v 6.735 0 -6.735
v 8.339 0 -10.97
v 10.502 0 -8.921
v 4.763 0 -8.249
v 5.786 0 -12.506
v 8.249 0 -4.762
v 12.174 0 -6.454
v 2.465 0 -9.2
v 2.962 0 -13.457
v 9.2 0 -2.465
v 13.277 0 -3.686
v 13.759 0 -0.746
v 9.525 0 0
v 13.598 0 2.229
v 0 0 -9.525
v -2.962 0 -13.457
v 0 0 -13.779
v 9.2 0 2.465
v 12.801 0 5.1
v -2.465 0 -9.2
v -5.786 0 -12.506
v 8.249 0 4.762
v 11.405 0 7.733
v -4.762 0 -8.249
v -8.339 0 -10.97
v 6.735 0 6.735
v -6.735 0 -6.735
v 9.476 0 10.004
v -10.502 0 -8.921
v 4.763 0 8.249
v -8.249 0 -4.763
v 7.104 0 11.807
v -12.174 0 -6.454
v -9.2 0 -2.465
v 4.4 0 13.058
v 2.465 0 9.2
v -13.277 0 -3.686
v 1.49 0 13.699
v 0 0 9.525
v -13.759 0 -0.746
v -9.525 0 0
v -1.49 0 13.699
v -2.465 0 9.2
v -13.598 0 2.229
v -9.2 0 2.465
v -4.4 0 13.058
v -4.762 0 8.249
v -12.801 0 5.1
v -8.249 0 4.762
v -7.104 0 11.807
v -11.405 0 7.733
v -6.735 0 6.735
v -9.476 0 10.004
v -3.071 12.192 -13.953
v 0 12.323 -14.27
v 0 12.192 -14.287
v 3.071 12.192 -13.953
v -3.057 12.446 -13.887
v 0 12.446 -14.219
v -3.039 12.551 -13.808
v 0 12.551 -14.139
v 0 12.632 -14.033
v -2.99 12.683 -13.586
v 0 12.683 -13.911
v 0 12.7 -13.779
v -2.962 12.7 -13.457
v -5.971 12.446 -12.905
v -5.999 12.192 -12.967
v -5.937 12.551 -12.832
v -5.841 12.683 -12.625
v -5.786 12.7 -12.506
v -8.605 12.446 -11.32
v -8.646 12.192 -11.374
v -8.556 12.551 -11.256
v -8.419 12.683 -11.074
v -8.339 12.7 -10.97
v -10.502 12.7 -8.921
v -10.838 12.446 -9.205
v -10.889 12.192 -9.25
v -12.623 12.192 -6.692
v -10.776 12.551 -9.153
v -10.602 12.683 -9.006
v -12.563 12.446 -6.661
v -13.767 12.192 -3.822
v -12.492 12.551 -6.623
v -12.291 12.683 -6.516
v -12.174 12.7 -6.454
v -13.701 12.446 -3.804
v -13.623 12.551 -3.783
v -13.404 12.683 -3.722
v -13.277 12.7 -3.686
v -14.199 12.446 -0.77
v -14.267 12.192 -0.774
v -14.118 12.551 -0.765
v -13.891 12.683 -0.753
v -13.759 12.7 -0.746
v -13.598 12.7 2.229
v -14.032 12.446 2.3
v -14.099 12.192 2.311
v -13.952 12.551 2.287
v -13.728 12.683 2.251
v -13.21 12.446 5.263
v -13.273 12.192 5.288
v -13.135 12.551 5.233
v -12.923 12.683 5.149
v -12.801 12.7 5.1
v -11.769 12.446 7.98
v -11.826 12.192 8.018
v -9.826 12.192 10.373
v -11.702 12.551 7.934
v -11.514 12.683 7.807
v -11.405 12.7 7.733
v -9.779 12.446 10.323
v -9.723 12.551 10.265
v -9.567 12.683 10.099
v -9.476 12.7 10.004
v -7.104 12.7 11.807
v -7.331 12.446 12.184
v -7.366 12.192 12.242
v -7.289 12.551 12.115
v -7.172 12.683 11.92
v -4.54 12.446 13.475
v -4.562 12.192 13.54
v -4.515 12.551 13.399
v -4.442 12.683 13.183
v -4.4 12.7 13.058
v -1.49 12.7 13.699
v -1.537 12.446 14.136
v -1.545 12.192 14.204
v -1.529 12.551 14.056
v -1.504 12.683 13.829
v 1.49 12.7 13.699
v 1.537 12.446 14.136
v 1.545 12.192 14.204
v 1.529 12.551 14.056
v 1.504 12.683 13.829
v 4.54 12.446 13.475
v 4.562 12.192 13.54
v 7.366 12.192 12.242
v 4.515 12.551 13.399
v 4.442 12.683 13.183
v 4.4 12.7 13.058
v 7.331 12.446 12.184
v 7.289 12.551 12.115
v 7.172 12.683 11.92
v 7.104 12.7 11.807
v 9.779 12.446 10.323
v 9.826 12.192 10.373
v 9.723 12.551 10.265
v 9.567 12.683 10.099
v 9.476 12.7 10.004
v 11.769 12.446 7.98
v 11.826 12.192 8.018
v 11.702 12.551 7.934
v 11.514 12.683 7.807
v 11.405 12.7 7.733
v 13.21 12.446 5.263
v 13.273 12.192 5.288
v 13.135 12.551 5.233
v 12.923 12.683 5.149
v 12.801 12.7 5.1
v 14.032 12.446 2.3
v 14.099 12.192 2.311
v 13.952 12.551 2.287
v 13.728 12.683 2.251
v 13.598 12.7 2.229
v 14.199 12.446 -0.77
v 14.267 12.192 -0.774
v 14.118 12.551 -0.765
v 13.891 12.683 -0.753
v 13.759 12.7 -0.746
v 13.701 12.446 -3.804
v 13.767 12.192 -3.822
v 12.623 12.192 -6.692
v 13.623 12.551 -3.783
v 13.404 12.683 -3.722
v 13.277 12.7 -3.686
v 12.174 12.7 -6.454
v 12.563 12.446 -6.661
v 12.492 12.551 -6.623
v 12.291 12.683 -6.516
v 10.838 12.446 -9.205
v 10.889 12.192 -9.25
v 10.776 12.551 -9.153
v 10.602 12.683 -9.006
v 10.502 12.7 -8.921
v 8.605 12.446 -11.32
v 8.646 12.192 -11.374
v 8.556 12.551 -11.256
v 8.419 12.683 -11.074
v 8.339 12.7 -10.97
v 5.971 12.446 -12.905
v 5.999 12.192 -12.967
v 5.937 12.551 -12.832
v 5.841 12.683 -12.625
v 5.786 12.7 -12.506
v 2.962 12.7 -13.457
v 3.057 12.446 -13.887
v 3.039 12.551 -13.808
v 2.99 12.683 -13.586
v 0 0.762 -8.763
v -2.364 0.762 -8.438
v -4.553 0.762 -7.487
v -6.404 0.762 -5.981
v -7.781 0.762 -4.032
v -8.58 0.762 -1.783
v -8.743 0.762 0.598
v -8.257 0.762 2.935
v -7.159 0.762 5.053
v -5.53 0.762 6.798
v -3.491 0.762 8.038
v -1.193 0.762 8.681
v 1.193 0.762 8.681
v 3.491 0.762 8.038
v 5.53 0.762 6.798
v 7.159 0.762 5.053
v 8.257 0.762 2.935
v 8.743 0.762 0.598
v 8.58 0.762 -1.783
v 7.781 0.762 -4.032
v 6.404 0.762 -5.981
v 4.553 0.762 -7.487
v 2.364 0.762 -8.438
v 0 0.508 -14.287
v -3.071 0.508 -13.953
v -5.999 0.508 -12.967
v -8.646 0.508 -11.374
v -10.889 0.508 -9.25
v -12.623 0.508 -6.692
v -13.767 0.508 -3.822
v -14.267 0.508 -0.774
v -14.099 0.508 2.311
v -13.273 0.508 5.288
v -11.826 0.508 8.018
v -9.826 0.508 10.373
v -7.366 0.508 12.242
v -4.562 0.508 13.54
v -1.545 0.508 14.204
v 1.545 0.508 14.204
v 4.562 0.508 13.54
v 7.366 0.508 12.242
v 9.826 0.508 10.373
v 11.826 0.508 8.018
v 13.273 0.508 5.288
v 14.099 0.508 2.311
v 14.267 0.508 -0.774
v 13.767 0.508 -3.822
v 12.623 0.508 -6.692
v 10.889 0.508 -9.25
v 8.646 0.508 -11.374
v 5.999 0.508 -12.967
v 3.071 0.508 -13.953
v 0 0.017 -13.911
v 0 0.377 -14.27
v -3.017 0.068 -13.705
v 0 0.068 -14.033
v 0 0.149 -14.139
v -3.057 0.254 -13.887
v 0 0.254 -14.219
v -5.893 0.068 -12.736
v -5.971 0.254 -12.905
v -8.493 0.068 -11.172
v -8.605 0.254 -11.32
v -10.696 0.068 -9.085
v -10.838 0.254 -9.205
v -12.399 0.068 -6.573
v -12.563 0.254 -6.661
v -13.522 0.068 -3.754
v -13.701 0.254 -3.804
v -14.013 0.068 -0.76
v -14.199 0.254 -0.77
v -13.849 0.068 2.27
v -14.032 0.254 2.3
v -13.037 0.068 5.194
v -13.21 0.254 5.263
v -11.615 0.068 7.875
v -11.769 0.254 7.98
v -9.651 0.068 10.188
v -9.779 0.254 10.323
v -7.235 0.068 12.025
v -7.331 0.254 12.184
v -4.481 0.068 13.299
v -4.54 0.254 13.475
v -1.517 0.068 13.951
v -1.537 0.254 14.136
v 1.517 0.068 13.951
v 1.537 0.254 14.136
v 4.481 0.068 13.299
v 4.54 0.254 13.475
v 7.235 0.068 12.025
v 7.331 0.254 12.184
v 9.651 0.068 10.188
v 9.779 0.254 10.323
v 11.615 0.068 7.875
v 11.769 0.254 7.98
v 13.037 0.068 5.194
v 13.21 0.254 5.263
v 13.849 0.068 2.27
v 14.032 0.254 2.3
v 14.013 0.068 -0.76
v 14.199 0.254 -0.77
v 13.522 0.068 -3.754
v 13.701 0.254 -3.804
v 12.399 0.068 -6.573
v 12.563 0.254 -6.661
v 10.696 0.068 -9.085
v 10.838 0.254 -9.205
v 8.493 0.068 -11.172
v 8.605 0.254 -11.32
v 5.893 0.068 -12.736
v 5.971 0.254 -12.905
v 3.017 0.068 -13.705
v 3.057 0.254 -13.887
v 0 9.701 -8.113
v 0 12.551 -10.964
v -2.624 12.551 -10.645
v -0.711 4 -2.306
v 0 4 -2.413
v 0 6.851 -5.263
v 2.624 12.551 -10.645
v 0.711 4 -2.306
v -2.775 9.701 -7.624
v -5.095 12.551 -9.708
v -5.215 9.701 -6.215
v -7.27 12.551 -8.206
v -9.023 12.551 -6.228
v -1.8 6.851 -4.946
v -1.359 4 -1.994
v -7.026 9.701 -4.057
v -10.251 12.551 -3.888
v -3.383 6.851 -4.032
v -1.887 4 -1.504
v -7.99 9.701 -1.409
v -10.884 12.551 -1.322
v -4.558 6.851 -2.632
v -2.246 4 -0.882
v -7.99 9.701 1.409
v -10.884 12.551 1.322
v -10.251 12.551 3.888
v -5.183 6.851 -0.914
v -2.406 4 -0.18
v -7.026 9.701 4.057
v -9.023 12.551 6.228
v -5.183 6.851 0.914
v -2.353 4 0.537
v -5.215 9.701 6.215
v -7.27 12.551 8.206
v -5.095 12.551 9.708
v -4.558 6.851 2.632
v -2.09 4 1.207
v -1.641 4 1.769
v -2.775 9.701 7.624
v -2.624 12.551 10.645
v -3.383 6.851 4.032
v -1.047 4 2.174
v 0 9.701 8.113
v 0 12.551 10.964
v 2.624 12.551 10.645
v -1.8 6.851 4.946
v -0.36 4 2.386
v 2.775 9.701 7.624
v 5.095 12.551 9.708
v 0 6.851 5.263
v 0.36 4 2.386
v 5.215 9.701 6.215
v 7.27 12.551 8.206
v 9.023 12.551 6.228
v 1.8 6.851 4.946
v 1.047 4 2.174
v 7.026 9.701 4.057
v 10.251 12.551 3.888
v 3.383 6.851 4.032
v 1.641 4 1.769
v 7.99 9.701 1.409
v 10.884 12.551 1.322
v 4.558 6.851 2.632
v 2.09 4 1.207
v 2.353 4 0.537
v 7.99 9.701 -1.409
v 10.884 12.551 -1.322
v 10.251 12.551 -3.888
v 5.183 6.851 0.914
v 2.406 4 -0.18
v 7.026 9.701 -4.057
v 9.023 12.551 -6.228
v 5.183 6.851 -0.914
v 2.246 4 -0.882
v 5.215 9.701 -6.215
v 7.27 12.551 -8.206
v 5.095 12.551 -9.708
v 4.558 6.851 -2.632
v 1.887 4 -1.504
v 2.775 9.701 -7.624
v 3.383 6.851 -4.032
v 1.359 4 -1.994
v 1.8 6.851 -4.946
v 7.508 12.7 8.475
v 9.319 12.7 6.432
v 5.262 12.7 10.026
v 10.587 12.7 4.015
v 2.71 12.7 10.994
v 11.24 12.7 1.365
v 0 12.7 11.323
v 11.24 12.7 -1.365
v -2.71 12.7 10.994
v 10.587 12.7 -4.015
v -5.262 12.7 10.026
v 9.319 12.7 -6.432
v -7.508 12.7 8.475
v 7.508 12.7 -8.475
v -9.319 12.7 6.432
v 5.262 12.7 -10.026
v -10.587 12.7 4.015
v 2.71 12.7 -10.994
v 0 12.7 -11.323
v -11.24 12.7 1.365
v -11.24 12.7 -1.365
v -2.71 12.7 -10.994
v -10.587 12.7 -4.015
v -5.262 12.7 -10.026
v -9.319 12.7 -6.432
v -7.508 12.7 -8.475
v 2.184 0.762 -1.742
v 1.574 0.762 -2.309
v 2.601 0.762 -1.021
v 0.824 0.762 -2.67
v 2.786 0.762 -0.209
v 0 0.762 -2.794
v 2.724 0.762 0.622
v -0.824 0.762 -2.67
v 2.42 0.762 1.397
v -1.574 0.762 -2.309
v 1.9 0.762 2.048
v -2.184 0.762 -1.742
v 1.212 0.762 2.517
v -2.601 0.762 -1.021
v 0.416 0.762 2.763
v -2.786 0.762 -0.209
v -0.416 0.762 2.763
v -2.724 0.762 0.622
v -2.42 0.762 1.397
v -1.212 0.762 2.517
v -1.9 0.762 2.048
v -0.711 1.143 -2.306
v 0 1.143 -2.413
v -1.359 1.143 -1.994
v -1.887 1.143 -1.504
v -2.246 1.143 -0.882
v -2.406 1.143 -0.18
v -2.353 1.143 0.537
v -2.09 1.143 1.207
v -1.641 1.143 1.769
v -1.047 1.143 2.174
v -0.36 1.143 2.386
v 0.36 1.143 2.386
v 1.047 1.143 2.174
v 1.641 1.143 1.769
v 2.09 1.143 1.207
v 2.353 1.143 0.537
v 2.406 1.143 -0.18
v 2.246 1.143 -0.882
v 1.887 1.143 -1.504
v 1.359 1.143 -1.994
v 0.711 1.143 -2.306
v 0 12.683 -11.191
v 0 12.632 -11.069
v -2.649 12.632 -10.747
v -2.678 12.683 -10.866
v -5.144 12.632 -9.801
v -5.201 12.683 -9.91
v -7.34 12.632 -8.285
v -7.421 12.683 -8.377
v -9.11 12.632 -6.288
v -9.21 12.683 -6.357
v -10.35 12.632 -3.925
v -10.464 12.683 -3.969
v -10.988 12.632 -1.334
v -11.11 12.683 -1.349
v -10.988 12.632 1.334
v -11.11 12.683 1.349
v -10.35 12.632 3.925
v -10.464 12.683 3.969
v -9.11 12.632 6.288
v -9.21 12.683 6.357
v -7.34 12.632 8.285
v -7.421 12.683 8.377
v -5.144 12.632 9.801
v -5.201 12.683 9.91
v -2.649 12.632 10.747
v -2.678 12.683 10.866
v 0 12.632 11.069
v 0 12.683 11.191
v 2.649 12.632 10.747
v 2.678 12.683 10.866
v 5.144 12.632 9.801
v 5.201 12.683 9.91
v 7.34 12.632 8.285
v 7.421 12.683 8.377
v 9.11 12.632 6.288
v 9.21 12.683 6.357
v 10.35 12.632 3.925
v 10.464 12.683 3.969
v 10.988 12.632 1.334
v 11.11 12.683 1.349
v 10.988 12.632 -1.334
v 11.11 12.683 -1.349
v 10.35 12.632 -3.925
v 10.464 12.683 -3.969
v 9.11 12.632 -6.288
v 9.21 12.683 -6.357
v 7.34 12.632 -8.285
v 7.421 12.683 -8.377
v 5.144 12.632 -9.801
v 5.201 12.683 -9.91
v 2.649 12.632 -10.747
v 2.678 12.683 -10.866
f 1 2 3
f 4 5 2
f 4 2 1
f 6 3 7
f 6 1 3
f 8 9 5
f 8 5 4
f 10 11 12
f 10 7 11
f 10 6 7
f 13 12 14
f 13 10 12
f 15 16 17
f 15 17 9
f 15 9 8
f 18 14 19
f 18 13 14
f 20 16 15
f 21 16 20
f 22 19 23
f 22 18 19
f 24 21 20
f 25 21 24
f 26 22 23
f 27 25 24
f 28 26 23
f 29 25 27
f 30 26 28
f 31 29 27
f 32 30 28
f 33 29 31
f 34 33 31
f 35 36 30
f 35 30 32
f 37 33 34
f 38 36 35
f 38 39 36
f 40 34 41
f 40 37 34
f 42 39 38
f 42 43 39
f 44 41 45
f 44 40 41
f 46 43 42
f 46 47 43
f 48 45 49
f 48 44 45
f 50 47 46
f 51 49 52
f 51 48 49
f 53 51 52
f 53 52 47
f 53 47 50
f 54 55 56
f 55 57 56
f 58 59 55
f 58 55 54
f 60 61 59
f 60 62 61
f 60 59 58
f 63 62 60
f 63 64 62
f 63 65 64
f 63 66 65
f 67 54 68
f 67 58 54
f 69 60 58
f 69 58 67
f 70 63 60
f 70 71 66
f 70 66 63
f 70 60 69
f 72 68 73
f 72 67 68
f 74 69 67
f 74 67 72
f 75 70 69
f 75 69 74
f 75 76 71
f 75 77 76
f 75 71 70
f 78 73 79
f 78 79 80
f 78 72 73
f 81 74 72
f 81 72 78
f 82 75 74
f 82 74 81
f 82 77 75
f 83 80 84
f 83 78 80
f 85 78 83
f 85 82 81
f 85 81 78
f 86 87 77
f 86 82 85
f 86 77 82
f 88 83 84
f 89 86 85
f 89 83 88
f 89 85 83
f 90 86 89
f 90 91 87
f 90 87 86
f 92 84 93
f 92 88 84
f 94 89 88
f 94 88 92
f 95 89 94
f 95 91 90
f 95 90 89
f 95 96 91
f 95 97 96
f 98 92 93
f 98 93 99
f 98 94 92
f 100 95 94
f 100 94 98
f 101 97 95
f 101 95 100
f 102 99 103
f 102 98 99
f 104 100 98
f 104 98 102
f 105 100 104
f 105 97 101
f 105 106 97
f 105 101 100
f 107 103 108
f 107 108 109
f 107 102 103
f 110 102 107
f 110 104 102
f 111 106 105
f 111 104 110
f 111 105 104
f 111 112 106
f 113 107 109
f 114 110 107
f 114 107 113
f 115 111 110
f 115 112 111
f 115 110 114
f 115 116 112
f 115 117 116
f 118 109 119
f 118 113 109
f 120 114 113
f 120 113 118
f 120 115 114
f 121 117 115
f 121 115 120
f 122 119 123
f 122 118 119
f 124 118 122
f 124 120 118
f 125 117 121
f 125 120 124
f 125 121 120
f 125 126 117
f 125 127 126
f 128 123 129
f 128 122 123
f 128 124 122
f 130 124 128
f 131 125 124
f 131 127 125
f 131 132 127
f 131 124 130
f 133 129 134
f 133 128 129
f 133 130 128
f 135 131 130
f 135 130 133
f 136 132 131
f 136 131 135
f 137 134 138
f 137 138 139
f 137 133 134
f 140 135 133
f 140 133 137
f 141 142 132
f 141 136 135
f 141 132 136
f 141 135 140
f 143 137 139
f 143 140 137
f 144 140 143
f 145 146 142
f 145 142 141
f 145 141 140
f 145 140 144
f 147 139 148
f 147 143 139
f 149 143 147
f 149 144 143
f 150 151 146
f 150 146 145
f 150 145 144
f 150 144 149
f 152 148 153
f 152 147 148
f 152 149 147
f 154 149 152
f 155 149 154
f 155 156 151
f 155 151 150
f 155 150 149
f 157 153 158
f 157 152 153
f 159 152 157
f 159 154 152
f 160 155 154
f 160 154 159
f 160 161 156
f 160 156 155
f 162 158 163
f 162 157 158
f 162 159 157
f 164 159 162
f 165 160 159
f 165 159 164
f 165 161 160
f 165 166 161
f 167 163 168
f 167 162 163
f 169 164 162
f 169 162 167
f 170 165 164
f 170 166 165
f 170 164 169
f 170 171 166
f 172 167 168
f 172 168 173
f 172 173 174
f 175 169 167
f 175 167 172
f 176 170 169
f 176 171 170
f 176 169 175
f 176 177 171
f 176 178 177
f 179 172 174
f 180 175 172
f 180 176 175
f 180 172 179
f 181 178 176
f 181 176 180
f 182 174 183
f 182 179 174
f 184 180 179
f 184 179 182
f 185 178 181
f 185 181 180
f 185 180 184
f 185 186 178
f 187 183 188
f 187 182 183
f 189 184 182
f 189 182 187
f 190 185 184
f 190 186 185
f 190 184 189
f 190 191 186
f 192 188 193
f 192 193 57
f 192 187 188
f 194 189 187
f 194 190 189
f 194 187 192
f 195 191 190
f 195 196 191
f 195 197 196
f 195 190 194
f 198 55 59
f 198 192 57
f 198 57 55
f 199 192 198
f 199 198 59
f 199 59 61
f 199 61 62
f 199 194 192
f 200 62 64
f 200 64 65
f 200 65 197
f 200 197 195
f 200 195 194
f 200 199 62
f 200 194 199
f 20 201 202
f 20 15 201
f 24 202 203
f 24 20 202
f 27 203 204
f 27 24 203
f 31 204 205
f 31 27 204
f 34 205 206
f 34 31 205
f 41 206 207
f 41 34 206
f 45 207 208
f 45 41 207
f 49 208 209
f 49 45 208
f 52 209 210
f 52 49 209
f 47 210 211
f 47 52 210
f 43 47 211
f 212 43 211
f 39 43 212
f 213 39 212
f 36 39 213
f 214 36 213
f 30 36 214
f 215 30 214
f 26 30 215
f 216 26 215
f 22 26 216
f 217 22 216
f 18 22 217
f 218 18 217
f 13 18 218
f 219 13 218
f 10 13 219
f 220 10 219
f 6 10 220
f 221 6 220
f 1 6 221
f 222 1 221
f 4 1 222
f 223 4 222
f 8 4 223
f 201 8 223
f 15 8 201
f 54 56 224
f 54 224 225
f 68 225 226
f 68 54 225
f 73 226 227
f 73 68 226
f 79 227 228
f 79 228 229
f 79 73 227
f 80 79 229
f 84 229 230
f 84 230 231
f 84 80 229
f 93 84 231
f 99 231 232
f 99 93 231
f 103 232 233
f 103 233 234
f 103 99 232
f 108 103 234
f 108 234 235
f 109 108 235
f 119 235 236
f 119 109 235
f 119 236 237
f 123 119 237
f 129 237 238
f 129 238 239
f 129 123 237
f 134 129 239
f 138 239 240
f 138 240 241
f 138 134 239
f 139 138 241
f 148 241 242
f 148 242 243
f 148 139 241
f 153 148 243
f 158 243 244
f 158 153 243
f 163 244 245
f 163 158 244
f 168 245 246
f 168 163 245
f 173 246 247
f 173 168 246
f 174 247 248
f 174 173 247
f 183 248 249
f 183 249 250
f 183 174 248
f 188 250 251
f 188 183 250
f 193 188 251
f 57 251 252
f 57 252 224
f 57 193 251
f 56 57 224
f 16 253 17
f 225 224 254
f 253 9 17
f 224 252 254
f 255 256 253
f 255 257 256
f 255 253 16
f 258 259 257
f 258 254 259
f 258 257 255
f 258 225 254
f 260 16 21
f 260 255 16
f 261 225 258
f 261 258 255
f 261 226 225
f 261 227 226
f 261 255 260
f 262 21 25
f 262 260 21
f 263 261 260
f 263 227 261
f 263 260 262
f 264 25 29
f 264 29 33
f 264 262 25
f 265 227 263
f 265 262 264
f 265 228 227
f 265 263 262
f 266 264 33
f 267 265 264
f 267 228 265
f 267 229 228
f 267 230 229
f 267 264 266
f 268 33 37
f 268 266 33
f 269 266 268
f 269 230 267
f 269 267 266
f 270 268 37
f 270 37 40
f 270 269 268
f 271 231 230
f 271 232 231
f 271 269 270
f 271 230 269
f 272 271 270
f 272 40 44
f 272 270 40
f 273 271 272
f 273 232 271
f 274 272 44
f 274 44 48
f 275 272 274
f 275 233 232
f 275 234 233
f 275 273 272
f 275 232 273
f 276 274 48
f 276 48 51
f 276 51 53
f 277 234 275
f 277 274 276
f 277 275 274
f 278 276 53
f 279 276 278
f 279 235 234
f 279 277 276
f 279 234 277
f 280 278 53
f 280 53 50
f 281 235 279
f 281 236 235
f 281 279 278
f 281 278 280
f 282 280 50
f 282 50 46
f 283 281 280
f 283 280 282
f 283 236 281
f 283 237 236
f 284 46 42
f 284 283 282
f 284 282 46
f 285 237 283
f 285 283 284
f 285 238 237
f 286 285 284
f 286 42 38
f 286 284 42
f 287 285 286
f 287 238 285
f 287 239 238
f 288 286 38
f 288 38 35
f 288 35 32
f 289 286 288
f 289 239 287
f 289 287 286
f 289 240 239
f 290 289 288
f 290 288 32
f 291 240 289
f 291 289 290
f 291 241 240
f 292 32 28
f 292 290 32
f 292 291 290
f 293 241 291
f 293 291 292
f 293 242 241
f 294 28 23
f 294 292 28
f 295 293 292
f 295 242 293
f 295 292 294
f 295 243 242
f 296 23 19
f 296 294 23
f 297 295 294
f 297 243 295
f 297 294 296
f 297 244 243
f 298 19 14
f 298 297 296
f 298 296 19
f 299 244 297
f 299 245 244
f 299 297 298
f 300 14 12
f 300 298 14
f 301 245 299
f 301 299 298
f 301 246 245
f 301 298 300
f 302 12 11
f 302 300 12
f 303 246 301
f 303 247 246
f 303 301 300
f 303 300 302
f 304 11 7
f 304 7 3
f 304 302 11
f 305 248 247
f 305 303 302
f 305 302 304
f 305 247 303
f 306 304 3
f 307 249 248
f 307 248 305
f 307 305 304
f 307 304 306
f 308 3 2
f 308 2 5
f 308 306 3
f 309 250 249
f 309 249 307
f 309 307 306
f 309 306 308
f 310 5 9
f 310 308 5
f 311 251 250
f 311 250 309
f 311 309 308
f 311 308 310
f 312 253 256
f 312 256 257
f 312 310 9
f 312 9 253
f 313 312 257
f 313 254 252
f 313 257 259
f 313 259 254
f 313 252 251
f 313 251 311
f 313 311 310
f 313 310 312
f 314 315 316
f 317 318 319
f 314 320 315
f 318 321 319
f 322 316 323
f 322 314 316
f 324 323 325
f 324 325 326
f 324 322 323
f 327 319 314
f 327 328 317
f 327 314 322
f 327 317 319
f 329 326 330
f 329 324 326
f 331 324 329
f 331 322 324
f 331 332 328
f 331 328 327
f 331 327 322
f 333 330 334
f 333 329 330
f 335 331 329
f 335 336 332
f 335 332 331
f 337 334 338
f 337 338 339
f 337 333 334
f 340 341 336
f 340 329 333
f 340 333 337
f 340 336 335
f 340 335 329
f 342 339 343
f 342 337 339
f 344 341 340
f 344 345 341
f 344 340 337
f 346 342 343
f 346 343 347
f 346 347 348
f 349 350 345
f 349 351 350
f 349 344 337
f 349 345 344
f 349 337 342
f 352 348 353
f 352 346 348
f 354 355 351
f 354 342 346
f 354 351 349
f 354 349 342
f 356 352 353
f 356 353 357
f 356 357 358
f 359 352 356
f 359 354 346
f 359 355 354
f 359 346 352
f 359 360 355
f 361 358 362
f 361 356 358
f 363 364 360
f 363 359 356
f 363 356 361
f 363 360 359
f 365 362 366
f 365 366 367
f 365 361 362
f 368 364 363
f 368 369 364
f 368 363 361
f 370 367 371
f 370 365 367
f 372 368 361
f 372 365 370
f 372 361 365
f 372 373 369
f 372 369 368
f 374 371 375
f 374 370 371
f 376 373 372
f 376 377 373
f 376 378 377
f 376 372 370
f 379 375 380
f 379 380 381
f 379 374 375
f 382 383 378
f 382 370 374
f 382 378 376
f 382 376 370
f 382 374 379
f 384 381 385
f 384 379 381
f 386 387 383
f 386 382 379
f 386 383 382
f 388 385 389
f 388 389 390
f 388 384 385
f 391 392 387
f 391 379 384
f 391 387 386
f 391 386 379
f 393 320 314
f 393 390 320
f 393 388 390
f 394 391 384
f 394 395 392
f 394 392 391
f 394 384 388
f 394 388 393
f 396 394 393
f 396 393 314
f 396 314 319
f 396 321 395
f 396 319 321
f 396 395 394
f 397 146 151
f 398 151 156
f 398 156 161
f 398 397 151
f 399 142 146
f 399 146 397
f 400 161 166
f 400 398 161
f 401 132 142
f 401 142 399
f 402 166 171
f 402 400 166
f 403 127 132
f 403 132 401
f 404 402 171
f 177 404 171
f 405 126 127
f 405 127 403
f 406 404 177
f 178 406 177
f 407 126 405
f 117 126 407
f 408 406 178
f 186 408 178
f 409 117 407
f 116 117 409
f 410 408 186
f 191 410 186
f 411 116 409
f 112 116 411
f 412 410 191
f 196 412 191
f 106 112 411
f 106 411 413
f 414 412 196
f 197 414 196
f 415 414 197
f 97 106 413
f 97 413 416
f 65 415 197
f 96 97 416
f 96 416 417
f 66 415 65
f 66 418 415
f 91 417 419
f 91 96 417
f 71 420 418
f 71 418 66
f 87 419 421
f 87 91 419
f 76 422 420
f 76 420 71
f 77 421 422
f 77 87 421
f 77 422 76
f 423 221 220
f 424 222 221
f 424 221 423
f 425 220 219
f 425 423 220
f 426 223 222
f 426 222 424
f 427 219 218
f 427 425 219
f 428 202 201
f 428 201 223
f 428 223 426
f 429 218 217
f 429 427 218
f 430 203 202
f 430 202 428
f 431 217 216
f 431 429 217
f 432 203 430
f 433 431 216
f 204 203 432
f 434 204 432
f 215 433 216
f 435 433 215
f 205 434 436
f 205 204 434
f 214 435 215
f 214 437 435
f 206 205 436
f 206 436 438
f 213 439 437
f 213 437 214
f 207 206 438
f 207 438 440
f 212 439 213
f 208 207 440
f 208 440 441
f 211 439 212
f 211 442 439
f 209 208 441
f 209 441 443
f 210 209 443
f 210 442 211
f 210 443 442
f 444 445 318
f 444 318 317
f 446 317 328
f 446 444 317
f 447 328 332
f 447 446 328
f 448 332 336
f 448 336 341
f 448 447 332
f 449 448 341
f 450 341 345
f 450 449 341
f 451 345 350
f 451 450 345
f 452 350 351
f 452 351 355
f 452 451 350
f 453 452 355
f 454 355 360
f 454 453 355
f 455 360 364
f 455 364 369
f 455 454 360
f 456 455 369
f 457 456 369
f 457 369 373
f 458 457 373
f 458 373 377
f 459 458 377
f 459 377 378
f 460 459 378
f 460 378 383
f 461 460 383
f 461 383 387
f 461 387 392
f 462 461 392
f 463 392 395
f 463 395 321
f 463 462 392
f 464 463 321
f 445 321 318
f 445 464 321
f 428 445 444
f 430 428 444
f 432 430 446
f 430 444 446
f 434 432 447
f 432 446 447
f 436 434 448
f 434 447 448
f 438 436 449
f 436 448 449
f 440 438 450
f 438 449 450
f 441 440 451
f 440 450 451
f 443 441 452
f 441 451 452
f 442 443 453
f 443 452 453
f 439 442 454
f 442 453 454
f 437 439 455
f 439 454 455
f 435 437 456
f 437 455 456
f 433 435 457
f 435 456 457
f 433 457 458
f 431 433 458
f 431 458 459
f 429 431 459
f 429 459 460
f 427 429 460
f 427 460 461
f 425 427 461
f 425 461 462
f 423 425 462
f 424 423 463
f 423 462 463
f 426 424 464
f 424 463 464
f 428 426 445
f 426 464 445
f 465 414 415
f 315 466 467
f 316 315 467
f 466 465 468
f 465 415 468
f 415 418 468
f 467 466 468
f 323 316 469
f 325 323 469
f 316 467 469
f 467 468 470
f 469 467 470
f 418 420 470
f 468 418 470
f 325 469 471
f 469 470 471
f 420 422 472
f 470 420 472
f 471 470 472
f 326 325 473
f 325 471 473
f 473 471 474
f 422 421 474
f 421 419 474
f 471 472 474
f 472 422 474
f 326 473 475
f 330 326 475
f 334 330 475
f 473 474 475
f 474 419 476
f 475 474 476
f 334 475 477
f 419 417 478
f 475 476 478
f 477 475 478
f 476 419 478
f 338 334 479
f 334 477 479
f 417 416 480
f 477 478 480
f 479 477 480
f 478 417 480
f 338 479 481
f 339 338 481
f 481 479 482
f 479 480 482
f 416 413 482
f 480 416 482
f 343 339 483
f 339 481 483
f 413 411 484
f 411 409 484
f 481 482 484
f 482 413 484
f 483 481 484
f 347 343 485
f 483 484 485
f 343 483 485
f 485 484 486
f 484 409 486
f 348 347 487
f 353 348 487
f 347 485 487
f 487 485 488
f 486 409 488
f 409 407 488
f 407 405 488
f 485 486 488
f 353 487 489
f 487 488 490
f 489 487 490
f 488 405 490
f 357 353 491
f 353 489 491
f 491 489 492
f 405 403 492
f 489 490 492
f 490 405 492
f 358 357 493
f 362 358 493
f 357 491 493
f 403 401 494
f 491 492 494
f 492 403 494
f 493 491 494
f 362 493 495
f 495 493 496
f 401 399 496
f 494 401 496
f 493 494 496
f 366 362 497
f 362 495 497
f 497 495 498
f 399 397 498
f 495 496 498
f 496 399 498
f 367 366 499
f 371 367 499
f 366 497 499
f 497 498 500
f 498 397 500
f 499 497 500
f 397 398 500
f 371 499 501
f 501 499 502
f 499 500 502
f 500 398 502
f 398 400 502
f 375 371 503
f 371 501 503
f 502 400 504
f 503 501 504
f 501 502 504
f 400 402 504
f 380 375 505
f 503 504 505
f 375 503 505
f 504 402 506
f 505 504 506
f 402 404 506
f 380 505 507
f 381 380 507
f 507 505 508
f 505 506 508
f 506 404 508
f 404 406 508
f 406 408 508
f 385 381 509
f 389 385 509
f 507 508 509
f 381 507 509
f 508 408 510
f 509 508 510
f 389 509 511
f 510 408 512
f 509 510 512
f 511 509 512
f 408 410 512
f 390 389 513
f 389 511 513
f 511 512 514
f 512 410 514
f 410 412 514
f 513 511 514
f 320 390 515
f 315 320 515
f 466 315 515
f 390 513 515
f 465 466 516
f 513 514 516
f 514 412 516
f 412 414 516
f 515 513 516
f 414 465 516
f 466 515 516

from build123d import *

# Parameters (mm, degrees)
CHAMFER1_SIZE = 0.381
FILLET1_R     = 0.508


with BuildPart() as part:
    # Sketch1 → Revolve1 (revolve)
    with BuildSketch(Plane.XY, mode=Mode.PRIVATE) as revolve1_sk:
        Polygon((2.413, 0.762), (8.763, 0.762), (9.525, 0), (14.2875, 0), (14.2875, 12.7), (11.1125, 12.7), (2.413, 4.0005), align=None)
    revolve(revolve1_sk.sketch.rotate(Axis((0, 0, 0), (0, 1, 0)), 90), axis=Axis((0, 0, 0), (0, 1, 0)))  # turned: the seam where the file's is

    # Chamfer1
    chamfer1_edges = [part.edges().sort_by_distance(p)[0] for p in [
        (0, 0.762, 2.413),
    ]]
    chamfer(chamfer1_edges, length=CHAMFER1_SIZE)

    # Fillet1
    fillet1_edges = [part.edges().sort_by_distance(p)[0] for p in [
        (0, 0, 14.2875),
        (0, 12.7, 14.2875),
        (0, 12.7, 11.1125),
    ]]
    fillet(fillet1_edges, radius=FILLET1_R)


solid = part.part
